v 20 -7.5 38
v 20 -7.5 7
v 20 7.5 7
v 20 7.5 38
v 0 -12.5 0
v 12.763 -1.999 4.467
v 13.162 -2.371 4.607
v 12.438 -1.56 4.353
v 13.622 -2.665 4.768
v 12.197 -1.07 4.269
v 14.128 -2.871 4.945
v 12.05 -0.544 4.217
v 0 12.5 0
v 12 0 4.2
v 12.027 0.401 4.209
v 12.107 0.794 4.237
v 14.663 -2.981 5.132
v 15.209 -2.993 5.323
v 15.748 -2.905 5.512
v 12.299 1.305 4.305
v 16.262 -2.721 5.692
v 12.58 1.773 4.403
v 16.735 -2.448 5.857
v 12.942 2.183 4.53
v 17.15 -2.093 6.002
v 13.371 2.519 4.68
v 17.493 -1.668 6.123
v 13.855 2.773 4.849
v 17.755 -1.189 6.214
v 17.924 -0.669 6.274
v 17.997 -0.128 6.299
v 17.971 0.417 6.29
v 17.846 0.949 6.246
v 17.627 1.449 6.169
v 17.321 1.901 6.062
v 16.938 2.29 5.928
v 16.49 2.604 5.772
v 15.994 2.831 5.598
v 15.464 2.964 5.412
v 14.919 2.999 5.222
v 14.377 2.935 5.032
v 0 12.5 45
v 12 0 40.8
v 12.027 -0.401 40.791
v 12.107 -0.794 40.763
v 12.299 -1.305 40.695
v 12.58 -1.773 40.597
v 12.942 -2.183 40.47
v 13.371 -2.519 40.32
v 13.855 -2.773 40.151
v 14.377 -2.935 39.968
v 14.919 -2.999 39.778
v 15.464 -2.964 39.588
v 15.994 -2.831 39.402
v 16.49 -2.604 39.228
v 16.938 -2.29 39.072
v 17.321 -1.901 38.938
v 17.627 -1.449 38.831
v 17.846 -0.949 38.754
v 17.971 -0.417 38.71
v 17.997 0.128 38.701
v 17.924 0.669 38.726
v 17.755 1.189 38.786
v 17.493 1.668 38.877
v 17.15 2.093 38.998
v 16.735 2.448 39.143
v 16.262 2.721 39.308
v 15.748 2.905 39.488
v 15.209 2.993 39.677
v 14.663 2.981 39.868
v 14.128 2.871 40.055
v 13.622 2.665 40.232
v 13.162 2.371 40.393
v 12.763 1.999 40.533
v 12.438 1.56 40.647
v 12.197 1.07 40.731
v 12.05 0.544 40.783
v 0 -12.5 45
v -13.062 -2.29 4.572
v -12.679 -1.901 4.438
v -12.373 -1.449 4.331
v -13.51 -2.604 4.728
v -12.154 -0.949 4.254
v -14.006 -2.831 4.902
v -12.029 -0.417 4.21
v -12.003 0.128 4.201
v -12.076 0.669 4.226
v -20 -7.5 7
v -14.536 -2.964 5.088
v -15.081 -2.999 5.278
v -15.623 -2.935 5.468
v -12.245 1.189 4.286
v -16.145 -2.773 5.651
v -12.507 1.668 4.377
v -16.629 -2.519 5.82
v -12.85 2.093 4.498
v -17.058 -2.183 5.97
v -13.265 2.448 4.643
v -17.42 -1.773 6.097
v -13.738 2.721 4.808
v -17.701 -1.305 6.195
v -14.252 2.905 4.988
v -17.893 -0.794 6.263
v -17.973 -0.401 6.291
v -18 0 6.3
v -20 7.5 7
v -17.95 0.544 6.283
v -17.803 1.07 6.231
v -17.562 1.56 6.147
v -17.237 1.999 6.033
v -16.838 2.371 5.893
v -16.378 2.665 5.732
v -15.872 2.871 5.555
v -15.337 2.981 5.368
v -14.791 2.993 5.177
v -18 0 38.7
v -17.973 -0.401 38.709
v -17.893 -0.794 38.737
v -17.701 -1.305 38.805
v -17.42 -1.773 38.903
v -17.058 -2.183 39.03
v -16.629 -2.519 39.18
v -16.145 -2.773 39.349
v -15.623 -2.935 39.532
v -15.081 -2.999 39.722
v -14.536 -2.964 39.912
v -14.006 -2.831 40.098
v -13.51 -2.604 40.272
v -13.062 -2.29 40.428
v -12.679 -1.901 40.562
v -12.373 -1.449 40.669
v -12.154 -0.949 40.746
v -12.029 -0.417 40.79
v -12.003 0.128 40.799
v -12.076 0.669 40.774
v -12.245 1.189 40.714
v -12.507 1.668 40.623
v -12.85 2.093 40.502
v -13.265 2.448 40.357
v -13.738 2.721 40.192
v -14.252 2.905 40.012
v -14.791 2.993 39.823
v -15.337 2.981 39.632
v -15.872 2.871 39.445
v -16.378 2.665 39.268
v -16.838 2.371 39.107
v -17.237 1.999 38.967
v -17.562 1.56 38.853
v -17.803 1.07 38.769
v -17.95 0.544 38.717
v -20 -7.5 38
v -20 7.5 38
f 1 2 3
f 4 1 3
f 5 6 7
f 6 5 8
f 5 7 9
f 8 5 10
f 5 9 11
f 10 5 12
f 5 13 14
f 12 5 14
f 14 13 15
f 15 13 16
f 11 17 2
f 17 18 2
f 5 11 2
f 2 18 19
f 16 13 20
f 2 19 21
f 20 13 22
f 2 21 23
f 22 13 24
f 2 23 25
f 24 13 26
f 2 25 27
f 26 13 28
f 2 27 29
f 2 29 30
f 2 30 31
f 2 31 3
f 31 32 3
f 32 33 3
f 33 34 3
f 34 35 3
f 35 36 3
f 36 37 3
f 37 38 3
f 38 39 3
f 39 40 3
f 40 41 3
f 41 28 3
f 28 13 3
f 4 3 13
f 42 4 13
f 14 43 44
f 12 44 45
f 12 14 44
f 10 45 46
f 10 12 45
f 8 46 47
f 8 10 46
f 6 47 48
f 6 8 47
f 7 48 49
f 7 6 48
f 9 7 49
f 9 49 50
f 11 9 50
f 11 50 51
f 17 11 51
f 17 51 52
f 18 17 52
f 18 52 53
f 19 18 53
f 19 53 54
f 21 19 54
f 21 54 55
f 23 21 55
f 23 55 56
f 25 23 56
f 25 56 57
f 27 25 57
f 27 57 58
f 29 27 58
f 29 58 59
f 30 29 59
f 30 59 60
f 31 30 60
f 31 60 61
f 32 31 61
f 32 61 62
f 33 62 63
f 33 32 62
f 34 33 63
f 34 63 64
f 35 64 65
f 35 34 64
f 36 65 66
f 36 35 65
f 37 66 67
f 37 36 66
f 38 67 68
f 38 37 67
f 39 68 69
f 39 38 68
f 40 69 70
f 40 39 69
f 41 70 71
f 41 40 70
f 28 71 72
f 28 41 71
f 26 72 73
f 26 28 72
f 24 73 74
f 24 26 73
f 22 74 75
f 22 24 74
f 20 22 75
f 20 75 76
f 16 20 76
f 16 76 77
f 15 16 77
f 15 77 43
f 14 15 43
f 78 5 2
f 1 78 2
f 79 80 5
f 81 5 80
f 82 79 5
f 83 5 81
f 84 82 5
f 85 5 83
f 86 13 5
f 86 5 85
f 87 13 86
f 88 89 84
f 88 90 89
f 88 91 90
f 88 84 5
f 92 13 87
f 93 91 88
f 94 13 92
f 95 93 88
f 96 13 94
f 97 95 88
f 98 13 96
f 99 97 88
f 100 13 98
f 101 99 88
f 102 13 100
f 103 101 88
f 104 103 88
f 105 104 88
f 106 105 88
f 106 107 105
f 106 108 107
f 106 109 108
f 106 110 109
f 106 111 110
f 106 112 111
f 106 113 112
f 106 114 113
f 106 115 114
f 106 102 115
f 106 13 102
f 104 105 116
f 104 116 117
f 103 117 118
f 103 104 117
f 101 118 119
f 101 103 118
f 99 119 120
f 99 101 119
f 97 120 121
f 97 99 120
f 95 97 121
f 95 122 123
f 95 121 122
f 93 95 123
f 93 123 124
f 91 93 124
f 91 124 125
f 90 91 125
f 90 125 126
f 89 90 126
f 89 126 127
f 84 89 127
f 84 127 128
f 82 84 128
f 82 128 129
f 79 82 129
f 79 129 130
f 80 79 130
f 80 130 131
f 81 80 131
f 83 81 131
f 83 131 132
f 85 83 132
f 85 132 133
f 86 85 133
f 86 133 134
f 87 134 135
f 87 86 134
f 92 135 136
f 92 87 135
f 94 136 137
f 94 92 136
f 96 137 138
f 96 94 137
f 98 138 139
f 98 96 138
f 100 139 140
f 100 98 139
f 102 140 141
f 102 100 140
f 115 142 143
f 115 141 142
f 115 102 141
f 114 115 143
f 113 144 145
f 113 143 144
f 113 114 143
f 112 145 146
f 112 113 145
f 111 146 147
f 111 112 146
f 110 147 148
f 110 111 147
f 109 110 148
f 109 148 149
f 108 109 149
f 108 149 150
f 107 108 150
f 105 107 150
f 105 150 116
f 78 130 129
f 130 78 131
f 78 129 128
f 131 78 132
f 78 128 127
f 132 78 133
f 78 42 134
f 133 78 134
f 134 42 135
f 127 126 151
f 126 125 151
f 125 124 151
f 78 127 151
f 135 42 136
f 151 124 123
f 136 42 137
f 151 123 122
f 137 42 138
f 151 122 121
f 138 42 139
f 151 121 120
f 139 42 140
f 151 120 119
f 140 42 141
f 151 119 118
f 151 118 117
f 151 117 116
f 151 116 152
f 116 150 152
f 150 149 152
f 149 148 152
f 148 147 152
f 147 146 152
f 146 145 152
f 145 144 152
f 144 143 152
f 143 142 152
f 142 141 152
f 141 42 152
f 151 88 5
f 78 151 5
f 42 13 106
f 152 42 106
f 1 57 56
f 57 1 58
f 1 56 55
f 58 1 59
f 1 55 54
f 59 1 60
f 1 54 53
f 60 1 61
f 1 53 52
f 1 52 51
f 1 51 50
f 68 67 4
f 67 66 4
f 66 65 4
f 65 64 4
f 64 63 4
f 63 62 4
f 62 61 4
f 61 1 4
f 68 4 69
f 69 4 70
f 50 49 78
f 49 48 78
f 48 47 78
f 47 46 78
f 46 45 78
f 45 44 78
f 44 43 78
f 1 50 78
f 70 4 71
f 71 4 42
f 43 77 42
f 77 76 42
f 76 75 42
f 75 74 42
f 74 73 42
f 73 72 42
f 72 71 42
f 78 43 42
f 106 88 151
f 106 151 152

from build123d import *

# Parameters (mm, degrees)
SKETCH1_W           = 40
SKETCH1_H           = 25
BOSS_EXTRUDE1_DEPTH = 45
CUT_EXTRUDE1_DEPTH  = 45
CUT_EXTRUDE2_DEPTH  = 45
SKETCH4_R           = 3
CUT_EXTRUDE3_DEPTH  = 51.806003582


with BuildPart() as part:
    # Sketch1 → Boss-Extrude1 (new body)
    with BuildSketch(Plane.XY):
        Rectangle(SKETCH1_W, SKETCH1_H)
    extrude(amount=BOSS_EXTRUDE1_DEPTH)

    # Sketch2 → Cut-Extrude1 (cut)
    with BuildSketch(Plane(origin=(0, 12.5, 0), x_dir=(1, 0, 0), z_dir=(0, 1, 0))):
        Polygon((0, -45), (-20, -38), (-20, -45), align=None)
        Polygon((20, -45), (20, -38), (0, -45), align=None)
        Polygon((20, 0), (0, 0), (20, -7), align=None)
        Polygon((0, 0), (-20, -7), (-20, 0), align=None)
    extrude(amount=-CUT_EXTRUDE1_DEPTH, mode=Mode.SUBTRACT)

    # Sketch3 → Cut-Extrude2 (cut)
    with BuildSketch(Plane.XY):
        Polygon((-20, 12.5), (0, 12.5), (-20, 7.5), align=None)
        Polygon((20, 12.5), (20, 7.5), (0, 12.5), align=None)
        Polygon((20, -12.5), (0, -12.5), (20, -7.5), align=None)
        Polygon((-20, -12.5), (-20, -7.5), (0, -12.5), align=None)
    extrude(amount=CUT_EXTRUDE2_DEPTH, mode=Mode.SUBTRACT)

    # Sketch4 → Cut-Extrude3 (cut, through all)
    with BuildSketch(Plane.XY):
        with Locations(Location((-15, 0, 0), (0, 0, 180))):
            Circle(SKETCH4_R)
        with Locations(Location((15, 0, 0), (0, 0, 180))):
            Circle(SKETCH4_R)
    extrude(amount=CUT_EXTRUDE3_DEPTH, mode=Mode.SUBTRACT)


solid = part.part
